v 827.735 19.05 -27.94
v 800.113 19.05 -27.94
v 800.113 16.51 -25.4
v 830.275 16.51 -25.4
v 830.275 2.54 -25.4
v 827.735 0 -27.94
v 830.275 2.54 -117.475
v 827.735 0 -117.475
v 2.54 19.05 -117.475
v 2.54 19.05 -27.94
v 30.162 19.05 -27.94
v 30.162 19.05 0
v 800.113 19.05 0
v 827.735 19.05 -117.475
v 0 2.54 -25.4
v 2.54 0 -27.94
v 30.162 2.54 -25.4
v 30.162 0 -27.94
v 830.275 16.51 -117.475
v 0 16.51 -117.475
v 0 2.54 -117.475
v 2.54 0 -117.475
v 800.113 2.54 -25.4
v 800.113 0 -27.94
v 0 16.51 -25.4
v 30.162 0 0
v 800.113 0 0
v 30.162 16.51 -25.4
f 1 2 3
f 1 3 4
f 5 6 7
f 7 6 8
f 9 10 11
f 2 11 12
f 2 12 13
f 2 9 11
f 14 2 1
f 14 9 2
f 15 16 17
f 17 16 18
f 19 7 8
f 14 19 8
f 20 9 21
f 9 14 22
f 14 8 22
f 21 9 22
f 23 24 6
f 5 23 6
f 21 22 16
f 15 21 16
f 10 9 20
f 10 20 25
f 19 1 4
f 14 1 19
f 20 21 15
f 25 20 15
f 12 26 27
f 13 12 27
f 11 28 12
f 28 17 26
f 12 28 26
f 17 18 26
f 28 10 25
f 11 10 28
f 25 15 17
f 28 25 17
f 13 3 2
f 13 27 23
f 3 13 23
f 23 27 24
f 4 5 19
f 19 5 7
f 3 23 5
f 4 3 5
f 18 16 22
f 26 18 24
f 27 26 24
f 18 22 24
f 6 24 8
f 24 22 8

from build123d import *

# Parameters (mm, degrees)
BOSS_EXTRUDE1_DEPTH = 19.05
CHAMFER1_SIZE       = 2.54


with BuildPart() as part:
    # Sketch1 → Boss-Extrude1 (new body)
    with BuildSketch(Plane(origin=(0, 0, 0), x_dir=(1, 0, 0), z_dir=(0, 1, 0))):
        Polygon((30.1625, 0), (800.1127, 0), (800.1127, 25.4), (830.2752, 25.4), (830.2752, 117.475), (0, 117.475), (0, 25.4), (30.1625, 25.4), align=None)
    extrude(amount=BOSS_EXTRUDE1_DEPTH)

    # Chamfer1
    chamfer1_edges = [part.edges().sort_by_distance(p)[0] for p in [
        (15.08125, 0, -25.4),
        (0, 0, -71.4375),
        (830.2752, 0, -71.4375),
        (0, 19.05, -71.4375),
        (15.08125, 19.05, -25.4),
        (815.19395, 19.05, -25.4),
        (830.2752, 19.05, -71.4375),
        (815.19395, 0, -25.4),
    ]]
    chamfer(chamfer1_edges, length=CHAMFER1_SIZE)


solid = part.part
